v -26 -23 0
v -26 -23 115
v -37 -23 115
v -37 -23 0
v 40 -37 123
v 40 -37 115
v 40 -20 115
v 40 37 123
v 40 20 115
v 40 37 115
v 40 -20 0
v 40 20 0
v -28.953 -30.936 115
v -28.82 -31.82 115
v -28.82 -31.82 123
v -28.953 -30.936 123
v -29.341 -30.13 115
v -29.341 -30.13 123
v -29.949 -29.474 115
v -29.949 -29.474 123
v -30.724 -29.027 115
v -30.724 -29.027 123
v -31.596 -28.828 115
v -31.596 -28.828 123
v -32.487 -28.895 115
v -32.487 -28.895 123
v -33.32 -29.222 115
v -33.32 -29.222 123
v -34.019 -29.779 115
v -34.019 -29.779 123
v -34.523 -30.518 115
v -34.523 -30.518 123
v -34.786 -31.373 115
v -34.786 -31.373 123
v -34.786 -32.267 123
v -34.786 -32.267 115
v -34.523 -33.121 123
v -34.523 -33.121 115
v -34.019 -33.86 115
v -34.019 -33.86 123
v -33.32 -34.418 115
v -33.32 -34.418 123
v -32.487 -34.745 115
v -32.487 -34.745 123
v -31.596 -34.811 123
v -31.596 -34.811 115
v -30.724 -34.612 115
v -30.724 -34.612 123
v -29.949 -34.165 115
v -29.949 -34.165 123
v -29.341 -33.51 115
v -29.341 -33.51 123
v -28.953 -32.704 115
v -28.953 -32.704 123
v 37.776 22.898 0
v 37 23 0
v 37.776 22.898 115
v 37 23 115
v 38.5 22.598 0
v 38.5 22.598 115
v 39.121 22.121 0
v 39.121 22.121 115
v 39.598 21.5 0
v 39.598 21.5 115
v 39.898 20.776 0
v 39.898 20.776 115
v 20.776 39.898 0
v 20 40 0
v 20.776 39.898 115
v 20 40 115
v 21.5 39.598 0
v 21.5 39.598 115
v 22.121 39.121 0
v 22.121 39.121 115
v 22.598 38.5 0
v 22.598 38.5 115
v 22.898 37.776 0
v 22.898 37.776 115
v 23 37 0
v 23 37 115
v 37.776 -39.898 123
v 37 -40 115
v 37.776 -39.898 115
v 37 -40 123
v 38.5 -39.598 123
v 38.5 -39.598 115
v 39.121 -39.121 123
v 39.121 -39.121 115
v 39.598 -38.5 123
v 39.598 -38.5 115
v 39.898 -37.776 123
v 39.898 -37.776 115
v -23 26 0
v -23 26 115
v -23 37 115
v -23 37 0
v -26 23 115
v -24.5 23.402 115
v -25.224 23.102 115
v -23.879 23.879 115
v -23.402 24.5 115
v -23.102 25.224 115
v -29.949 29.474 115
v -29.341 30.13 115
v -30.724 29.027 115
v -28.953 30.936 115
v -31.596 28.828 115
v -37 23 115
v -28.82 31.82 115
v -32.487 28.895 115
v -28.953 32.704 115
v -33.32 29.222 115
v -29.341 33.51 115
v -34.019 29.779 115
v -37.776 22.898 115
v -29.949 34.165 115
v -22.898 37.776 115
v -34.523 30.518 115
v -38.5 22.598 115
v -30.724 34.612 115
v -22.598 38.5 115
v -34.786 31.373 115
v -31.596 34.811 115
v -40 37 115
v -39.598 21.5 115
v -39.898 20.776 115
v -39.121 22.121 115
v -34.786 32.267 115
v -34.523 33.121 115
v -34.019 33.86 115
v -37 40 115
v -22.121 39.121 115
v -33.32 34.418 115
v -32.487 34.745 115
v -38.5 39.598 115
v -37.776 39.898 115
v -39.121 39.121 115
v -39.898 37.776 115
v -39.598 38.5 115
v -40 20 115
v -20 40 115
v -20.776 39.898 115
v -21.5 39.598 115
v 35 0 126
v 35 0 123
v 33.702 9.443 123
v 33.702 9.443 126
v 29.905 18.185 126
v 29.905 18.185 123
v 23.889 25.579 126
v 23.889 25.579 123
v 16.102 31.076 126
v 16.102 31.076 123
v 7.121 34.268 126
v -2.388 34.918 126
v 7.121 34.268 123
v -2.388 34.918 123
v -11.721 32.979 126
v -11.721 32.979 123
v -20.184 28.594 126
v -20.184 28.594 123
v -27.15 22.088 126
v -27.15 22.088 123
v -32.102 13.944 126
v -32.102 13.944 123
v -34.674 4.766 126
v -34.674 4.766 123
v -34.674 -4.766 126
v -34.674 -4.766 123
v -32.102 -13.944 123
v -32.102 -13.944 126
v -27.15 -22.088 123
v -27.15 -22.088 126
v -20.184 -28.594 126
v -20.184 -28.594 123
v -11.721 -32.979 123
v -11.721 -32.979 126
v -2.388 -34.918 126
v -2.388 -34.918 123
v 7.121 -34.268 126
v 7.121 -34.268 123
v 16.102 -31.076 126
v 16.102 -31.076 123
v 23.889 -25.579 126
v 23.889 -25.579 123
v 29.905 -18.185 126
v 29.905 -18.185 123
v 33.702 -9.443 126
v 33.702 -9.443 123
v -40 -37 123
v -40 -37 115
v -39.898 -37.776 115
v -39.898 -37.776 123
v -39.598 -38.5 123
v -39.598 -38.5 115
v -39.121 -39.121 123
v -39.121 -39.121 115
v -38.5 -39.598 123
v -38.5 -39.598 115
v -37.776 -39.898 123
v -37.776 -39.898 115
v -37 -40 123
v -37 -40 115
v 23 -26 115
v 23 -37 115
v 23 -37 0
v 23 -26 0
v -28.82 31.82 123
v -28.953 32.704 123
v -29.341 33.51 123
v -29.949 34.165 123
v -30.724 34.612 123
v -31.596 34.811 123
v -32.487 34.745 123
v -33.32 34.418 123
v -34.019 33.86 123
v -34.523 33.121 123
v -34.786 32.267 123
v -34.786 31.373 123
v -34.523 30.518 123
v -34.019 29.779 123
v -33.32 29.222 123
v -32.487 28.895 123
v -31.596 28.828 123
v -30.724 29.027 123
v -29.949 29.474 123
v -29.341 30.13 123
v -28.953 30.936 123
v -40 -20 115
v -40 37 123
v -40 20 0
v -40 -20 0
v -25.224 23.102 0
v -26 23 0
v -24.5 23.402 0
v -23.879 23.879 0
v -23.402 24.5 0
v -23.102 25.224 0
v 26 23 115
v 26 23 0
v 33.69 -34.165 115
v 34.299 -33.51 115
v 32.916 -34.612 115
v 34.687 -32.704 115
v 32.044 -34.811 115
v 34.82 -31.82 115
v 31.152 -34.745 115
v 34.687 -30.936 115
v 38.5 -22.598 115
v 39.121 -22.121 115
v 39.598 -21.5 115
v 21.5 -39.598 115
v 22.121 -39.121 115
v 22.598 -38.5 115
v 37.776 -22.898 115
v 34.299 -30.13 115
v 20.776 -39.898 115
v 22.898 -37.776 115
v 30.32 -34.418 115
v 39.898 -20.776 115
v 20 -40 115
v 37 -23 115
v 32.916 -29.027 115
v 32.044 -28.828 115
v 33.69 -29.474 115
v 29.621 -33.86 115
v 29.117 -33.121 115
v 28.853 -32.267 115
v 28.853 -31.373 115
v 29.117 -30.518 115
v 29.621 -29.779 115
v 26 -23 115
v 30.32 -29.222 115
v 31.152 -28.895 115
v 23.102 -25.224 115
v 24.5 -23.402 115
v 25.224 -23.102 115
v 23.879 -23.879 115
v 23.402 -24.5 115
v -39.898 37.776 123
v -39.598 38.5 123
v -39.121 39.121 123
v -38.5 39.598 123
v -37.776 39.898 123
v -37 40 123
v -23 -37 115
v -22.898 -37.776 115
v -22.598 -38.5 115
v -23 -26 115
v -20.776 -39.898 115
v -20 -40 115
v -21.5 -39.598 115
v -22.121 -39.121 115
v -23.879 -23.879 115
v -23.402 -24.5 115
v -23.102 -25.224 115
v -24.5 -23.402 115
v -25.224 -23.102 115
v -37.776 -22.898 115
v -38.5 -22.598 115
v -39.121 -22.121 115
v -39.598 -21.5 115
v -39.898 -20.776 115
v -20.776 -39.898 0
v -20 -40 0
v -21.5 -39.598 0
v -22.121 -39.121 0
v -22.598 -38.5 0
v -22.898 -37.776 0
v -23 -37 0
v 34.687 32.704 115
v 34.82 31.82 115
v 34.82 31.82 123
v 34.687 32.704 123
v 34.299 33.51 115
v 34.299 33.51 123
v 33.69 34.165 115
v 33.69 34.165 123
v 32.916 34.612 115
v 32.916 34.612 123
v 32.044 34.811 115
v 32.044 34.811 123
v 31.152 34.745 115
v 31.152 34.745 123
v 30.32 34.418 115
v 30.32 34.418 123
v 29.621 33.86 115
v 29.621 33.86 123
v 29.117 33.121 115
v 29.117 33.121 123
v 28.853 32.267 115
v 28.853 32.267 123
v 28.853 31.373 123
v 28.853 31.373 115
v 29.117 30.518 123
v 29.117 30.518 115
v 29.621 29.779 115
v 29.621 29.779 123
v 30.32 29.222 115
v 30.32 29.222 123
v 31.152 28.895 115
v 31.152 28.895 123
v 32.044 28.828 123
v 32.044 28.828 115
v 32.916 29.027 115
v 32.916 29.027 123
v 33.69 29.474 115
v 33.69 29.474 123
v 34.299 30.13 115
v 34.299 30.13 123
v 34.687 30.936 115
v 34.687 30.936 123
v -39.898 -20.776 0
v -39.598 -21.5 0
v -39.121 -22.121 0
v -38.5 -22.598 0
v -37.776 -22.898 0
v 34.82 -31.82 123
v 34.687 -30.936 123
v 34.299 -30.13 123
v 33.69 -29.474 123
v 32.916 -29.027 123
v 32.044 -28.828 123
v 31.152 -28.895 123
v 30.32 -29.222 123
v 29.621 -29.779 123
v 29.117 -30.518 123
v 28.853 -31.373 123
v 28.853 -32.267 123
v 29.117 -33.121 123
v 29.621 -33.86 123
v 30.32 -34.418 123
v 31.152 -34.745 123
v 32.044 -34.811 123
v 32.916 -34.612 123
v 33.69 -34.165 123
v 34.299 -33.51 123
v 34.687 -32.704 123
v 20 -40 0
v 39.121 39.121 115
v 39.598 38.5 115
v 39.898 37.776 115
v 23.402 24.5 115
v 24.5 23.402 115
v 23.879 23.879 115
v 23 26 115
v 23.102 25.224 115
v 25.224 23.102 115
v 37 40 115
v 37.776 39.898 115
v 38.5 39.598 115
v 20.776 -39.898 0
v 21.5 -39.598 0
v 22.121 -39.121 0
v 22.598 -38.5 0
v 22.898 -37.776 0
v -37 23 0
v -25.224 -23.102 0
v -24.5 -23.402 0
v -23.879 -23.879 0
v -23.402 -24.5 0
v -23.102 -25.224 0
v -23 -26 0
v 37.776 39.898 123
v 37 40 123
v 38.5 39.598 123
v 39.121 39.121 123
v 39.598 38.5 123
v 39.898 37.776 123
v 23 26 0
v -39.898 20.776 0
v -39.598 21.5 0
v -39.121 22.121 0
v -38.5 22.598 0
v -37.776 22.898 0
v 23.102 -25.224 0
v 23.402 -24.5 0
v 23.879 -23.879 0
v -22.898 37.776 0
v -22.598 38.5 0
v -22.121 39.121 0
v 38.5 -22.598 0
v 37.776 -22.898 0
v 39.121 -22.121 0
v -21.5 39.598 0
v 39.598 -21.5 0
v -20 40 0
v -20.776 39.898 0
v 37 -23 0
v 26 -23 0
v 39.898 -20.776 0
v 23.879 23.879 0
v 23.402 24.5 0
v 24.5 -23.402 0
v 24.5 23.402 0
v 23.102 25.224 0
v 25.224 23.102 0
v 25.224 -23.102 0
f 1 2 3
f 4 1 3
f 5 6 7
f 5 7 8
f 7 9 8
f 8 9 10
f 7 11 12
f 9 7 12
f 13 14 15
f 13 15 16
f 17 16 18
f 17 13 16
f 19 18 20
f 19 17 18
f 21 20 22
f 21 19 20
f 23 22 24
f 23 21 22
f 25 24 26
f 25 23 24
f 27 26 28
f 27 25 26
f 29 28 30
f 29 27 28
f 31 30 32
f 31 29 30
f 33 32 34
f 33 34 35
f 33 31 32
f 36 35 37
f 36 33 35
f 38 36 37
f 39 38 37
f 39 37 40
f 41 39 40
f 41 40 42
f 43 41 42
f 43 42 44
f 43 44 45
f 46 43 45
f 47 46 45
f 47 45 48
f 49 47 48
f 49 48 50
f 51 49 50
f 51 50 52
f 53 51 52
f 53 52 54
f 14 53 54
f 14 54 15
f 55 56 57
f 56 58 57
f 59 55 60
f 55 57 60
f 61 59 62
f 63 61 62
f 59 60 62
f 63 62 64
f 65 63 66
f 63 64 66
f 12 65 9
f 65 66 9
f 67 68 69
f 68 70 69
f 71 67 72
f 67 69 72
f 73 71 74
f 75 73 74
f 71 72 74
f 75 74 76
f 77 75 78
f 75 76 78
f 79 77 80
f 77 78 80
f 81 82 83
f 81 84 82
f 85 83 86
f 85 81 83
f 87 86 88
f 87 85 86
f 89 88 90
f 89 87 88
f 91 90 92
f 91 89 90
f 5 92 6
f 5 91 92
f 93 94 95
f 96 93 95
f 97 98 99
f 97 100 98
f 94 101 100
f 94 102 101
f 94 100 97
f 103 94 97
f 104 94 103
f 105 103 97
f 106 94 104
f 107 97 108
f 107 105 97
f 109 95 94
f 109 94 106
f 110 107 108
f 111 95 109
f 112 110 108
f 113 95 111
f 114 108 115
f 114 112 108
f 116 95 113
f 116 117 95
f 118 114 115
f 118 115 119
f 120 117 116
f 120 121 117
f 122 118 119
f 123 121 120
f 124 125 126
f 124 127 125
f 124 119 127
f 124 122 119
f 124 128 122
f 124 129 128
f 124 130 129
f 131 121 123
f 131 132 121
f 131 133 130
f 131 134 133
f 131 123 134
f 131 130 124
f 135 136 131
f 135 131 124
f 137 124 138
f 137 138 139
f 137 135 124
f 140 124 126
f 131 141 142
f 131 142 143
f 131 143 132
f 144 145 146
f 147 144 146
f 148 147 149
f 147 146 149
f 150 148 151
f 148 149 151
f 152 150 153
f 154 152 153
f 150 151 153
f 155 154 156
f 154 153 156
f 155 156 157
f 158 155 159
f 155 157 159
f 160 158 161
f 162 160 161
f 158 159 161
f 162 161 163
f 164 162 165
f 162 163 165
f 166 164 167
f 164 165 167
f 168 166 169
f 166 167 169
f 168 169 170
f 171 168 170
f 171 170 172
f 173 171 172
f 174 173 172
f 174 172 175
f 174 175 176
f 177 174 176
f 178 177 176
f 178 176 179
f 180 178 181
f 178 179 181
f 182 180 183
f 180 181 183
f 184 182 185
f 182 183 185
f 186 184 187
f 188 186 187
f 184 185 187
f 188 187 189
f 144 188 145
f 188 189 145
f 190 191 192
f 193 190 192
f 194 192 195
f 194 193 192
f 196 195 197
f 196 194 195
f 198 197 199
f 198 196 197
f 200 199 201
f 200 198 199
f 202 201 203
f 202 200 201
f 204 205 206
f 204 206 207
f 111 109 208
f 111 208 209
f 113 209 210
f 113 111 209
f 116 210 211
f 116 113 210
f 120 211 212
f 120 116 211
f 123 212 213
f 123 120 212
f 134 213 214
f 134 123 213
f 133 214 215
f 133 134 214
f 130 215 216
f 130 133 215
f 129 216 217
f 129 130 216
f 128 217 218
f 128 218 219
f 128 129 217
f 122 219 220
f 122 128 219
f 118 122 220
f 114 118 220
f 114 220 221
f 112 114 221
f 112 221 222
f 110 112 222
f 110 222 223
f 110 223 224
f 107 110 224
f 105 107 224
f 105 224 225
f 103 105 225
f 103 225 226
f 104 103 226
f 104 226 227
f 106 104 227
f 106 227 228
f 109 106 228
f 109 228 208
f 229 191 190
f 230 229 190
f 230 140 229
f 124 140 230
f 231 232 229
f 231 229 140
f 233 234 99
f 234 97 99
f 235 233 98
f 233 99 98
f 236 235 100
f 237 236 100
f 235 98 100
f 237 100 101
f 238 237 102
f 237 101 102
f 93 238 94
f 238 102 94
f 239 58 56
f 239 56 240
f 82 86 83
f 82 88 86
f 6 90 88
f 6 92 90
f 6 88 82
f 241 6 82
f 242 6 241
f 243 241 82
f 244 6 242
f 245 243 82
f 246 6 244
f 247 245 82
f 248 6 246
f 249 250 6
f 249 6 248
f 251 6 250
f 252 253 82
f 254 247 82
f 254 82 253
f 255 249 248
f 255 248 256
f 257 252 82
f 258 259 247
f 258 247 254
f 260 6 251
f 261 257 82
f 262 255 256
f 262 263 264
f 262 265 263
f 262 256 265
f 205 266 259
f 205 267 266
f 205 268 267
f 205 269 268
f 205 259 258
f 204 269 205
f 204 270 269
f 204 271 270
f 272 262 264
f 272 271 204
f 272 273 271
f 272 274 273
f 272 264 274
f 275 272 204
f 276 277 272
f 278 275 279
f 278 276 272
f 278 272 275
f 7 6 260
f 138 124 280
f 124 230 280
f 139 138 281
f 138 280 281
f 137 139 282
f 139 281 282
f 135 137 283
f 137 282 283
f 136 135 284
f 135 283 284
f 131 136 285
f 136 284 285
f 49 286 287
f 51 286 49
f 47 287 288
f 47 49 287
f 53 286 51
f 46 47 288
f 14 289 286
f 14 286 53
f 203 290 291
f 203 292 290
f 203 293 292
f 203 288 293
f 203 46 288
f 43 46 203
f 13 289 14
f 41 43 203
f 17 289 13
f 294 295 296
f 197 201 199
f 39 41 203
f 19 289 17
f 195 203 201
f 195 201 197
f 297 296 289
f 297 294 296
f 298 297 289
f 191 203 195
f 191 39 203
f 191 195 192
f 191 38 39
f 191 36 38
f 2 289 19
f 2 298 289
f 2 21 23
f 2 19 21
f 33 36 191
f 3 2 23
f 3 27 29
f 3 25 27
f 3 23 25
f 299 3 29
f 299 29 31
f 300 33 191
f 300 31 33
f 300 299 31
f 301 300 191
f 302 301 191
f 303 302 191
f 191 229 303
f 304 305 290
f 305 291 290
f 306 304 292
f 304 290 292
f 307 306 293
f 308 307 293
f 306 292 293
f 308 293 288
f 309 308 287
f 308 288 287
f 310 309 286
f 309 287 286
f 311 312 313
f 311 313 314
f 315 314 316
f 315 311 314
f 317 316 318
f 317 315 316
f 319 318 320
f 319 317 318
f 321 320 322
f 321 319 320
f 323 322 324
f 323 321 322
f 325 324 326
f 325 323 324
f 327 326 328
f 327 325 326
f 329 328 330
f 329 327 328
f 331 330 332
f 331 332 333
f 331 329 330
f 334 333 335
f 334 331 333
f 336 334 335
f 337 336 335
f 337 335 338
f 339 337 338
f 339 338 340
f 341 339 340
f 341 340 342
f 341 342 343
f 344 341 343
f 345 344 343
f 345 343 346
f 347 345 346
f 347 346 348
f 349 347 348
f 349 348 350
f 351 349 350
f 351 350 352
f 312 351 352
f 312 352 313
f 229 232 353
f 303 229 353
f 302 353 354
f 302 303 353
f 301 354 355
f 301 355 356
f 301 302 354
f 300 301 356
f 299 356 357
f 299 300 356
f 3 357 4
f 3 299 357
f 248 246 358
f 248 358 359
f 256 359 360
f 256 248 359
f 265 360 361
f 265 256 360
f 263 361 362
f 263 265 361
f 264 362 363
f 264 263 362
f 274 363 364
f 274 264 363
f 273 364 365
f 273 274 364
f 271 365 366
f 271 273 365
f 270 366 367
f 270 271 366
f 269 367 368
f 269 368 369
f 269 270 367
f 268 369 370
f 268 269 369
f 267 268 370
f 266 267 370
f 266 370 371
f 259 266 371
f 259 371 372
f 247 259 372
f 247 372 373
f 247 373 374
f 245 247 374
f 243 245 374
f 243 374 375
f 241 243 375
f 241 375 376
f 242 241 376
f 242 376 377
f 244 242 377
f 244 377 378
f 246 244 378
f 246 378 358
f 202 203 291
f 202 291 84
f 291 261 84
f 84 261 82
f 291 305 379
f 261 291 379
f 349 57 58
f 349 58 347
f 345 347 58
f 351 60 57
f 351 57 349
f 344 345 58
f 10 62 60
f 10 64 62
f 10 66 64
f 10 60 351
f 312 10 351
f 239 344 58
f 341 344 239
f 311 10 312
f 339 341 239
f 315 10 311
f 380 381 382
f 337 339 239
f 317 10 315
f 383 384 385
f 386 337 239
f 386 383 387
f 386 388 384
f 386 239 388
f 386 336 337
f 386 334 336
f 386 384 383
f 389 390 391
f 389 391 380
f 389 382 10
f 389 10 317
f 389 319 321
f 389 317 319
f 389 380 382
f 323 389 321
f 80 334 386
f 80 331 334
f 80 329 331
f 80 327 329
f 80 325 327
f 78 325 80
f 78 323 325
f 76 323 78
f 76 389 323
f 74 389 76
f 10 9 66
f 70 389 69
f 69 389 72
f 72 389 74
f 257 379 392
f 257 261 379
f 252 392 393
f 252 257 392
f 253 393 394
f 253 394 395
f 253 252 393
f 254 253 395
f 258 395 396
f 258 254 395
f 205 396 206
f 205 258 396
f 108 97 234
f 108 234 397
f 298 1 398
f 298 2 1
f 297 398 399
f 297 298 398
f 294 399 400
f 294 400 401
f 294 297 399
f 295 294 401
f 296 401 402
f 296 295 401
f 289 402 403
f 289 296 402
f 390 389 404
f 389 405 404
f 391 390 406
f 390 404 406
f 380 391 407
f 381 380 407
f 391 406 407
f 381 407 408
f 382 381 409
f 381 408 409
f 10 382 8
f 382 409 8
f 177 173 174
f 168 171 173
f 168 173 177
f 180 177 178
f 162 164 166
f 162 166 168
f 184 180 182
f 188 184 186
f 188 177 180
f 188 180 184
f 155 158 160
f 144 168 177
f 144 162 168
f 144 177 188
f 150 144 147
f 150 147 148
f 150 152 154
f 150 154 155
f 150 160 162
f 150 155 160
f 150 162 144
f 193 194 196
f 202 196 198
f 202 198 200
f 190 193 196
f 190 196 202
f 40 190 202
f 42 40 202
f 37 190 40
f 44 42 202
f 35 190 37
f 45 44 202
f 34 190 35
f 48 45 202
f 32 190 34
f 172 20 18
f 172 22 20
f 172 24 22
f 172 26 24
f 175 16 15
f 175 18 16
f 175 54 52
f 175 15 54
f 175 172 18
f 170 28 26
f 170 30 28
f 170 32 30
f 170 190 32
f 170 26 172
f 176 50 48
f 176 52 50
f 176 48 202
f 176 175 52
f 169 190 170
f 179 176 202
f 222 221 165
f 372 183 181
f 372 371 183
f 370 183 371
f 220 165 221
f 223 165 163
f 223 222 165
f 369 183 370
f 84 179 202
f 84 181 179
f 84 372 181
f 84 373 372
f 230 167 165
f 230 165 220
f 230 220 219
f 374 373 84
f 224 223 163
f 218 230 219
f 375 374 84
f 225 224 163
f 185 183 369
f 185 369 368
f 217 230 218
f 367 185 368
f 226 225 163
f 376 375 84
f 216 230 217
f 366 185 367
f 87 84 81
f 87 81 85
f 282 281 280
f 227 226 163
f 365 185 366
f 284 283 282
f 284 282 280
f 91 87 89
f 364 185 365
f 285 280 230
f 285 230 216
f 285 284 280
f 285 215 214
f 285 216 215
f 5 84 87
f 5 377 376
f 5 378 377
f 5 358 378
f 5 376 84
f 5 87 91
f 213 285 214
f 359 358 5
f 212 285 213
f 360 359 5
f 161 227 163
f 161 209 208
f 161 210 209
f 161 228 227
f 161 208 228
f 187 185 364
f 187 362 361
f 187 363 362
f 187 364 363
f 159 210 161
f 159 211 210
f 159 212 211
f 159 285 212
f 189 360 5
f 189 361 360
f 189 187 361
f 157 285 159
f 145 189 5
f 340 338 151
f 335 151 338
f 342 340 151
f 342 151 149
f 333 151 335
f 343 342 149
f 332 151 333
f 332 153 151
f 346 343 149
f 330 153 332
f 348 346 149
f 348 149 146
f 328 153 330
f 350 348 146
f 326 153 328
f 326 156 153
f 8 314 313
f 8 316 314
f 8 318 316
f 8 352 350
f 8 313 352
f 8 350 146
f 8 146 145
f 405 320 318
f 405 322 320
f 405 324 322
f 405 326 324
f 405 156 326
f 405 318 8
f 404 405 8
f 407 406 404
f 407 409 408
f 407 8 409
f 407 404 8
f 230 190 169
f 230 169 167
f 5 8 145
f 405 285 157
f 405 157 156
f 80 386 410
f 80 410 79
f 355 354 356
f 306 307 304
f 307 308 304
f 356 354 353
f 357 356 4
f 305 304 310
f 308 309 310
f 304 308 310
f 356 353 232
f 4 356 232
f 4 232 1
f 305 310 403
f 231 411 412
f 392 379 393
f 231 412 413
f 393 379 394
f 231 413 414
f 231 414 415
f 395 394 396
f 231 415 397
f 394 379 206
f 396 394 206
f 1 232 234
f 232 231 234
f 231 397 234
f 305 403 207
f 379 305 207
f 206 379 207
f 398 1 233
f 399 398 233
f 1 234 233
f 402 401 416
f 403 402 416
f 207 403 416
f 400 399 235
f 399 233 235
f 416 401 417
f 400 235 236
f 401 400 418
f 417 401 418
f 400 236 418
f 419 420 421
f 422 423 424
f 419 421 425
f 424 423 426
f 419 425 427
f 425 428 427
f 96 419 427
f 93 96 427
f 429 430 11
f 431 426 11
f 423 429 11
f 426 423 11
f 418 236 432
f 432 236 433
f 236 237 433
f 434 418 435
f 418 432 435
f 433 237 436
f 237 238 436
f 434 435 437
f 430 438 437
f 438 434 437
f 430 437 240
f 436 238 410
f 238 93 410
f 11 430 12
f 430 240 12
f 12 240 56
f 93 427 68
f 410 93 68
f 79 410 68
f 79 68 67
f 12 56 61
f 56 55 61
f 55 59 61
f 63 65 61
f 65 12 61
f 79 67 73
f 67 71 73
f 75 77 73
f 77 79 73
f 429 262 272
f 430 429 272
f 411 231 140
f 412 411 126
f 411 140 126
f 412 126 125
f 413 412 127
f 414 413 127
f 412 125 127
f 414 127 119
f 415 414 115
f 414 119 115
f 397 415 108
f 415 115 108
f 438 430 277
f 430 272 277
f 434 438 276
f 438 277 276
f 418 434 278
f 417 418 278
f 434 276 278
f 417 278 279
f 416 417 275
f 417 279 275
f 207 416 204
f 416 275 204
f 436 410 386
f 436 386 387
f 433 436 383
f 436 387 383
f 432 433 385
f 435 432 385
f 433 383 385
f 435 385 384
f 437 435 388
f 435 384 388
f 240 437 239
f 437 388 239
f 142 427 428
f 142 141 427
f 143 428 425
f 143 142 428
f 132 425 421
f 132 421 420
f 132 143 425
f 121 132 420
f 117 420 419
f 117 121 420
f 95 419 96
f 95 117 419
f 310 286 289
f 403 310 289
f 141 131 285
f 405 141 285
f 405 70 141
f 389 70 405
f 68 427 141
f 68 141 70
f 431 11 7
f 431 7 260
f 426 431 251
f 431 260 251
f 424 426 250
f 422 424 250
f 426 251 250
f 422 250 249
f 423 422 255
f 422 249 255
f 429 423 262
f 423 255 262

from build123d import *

# Parameters (mm, degrees)
SKETCH1_W           = 80
SKETCH1_H           = 80
SKETCH1_R           = 3
BOSS_EXTRUDE1_DEPTH = 123
SKETCH2_R           = 35
BOSS_EXTRUDE2_DEPTH = 3
SKETCH4_W           = 17
SKETCH4_H           = 17
CUT_EXTRUDE1_DEPTH  = 115
FILLET1_R           = 3


with BuildPart() as part:
    # Sketch1 → Boss-Extrude1 (new body)
    with BuildSketch(Plane.XY):
        Rectangle(SKETCH1_W, SKETCH1_H)
        with Locations((-31.819805153, 31.819805153)):
            Circle(SKETCH1_R, mode=Mode.SUBTRACT)
        with Locations((31.819805153, 31.819805153)):
            Circle(SKETCH1_R, mode=Mode.SUBTRACT)
        with Locations((31.819805153, -31.819805153)):
            Circle(SKETCH1_R, mode=Mode.SUBTRACT)
        with Locations((-31.819805153, -31.819805153)):
            Circle(SKETCH1_R, mode=Mode.SUBTRACT)
    extrude(amount=BOSS_EXTRUDE1_DEPTH)

    # Sketch2 → Boss-Extrude2 (add)
    with BuildSketch(Plane.XY.offset(123)):
        Circle(SKETCH2_R)
    extrude(amount=BOSS_EXTRUDE2_DEPTH)

    # Sketch4 → Cut-Extrude1 (cut)
    with BuildSketch(Plane(origin=(0, 0, 0), x_dir=(-1, 0, 0), z_dir=(0, 0, -1))):
        with Locations((31.5, 31.5)):
            Rectangle(SKETCH4_W, SKETCH4_H)
        with Locations((-31.5, 31.5)):
            Rectangle(SKETCH4_W, SKETCH4_H)
        with Locations((31.5, -31.5)):
            Rectangle(SKETCH4_W, SKETCH4_H)
        with Locations((-31.5, -31.5)):
            Rectangle(SKETCH4_W, SKETCH4_H)
    extrude(amount=-CUT_EXTRUDE1_DEPTH, mode=Mode.SUBTRACT)

    # Fillet1
    fillet1_edges = [part.edges().sort_by_distance(p)[0] for p in [
        (40, -23, 57.5),
        (23, -23, 57.5),
        (23, -40, 57.5),
        (-23, -40, 57.5),
        (-23, -23, 57.5),
        (-40, -23, 57.5),
        (-40, 23, 57.5),
        (-23, 23, 57.5),
        (-23, 40, 57.5),
        (40, 23, 57.5),
        (23, 40, 57.5),
        (23, 23, 57.5),
        (40, -40, 119),
        (-40, -40, 119),
        (-40, 40, 119),
        (40, 40, 119),
    ]]
    fillet(fillet1_edges, radius=FILLET1_R)


solid = part.part
